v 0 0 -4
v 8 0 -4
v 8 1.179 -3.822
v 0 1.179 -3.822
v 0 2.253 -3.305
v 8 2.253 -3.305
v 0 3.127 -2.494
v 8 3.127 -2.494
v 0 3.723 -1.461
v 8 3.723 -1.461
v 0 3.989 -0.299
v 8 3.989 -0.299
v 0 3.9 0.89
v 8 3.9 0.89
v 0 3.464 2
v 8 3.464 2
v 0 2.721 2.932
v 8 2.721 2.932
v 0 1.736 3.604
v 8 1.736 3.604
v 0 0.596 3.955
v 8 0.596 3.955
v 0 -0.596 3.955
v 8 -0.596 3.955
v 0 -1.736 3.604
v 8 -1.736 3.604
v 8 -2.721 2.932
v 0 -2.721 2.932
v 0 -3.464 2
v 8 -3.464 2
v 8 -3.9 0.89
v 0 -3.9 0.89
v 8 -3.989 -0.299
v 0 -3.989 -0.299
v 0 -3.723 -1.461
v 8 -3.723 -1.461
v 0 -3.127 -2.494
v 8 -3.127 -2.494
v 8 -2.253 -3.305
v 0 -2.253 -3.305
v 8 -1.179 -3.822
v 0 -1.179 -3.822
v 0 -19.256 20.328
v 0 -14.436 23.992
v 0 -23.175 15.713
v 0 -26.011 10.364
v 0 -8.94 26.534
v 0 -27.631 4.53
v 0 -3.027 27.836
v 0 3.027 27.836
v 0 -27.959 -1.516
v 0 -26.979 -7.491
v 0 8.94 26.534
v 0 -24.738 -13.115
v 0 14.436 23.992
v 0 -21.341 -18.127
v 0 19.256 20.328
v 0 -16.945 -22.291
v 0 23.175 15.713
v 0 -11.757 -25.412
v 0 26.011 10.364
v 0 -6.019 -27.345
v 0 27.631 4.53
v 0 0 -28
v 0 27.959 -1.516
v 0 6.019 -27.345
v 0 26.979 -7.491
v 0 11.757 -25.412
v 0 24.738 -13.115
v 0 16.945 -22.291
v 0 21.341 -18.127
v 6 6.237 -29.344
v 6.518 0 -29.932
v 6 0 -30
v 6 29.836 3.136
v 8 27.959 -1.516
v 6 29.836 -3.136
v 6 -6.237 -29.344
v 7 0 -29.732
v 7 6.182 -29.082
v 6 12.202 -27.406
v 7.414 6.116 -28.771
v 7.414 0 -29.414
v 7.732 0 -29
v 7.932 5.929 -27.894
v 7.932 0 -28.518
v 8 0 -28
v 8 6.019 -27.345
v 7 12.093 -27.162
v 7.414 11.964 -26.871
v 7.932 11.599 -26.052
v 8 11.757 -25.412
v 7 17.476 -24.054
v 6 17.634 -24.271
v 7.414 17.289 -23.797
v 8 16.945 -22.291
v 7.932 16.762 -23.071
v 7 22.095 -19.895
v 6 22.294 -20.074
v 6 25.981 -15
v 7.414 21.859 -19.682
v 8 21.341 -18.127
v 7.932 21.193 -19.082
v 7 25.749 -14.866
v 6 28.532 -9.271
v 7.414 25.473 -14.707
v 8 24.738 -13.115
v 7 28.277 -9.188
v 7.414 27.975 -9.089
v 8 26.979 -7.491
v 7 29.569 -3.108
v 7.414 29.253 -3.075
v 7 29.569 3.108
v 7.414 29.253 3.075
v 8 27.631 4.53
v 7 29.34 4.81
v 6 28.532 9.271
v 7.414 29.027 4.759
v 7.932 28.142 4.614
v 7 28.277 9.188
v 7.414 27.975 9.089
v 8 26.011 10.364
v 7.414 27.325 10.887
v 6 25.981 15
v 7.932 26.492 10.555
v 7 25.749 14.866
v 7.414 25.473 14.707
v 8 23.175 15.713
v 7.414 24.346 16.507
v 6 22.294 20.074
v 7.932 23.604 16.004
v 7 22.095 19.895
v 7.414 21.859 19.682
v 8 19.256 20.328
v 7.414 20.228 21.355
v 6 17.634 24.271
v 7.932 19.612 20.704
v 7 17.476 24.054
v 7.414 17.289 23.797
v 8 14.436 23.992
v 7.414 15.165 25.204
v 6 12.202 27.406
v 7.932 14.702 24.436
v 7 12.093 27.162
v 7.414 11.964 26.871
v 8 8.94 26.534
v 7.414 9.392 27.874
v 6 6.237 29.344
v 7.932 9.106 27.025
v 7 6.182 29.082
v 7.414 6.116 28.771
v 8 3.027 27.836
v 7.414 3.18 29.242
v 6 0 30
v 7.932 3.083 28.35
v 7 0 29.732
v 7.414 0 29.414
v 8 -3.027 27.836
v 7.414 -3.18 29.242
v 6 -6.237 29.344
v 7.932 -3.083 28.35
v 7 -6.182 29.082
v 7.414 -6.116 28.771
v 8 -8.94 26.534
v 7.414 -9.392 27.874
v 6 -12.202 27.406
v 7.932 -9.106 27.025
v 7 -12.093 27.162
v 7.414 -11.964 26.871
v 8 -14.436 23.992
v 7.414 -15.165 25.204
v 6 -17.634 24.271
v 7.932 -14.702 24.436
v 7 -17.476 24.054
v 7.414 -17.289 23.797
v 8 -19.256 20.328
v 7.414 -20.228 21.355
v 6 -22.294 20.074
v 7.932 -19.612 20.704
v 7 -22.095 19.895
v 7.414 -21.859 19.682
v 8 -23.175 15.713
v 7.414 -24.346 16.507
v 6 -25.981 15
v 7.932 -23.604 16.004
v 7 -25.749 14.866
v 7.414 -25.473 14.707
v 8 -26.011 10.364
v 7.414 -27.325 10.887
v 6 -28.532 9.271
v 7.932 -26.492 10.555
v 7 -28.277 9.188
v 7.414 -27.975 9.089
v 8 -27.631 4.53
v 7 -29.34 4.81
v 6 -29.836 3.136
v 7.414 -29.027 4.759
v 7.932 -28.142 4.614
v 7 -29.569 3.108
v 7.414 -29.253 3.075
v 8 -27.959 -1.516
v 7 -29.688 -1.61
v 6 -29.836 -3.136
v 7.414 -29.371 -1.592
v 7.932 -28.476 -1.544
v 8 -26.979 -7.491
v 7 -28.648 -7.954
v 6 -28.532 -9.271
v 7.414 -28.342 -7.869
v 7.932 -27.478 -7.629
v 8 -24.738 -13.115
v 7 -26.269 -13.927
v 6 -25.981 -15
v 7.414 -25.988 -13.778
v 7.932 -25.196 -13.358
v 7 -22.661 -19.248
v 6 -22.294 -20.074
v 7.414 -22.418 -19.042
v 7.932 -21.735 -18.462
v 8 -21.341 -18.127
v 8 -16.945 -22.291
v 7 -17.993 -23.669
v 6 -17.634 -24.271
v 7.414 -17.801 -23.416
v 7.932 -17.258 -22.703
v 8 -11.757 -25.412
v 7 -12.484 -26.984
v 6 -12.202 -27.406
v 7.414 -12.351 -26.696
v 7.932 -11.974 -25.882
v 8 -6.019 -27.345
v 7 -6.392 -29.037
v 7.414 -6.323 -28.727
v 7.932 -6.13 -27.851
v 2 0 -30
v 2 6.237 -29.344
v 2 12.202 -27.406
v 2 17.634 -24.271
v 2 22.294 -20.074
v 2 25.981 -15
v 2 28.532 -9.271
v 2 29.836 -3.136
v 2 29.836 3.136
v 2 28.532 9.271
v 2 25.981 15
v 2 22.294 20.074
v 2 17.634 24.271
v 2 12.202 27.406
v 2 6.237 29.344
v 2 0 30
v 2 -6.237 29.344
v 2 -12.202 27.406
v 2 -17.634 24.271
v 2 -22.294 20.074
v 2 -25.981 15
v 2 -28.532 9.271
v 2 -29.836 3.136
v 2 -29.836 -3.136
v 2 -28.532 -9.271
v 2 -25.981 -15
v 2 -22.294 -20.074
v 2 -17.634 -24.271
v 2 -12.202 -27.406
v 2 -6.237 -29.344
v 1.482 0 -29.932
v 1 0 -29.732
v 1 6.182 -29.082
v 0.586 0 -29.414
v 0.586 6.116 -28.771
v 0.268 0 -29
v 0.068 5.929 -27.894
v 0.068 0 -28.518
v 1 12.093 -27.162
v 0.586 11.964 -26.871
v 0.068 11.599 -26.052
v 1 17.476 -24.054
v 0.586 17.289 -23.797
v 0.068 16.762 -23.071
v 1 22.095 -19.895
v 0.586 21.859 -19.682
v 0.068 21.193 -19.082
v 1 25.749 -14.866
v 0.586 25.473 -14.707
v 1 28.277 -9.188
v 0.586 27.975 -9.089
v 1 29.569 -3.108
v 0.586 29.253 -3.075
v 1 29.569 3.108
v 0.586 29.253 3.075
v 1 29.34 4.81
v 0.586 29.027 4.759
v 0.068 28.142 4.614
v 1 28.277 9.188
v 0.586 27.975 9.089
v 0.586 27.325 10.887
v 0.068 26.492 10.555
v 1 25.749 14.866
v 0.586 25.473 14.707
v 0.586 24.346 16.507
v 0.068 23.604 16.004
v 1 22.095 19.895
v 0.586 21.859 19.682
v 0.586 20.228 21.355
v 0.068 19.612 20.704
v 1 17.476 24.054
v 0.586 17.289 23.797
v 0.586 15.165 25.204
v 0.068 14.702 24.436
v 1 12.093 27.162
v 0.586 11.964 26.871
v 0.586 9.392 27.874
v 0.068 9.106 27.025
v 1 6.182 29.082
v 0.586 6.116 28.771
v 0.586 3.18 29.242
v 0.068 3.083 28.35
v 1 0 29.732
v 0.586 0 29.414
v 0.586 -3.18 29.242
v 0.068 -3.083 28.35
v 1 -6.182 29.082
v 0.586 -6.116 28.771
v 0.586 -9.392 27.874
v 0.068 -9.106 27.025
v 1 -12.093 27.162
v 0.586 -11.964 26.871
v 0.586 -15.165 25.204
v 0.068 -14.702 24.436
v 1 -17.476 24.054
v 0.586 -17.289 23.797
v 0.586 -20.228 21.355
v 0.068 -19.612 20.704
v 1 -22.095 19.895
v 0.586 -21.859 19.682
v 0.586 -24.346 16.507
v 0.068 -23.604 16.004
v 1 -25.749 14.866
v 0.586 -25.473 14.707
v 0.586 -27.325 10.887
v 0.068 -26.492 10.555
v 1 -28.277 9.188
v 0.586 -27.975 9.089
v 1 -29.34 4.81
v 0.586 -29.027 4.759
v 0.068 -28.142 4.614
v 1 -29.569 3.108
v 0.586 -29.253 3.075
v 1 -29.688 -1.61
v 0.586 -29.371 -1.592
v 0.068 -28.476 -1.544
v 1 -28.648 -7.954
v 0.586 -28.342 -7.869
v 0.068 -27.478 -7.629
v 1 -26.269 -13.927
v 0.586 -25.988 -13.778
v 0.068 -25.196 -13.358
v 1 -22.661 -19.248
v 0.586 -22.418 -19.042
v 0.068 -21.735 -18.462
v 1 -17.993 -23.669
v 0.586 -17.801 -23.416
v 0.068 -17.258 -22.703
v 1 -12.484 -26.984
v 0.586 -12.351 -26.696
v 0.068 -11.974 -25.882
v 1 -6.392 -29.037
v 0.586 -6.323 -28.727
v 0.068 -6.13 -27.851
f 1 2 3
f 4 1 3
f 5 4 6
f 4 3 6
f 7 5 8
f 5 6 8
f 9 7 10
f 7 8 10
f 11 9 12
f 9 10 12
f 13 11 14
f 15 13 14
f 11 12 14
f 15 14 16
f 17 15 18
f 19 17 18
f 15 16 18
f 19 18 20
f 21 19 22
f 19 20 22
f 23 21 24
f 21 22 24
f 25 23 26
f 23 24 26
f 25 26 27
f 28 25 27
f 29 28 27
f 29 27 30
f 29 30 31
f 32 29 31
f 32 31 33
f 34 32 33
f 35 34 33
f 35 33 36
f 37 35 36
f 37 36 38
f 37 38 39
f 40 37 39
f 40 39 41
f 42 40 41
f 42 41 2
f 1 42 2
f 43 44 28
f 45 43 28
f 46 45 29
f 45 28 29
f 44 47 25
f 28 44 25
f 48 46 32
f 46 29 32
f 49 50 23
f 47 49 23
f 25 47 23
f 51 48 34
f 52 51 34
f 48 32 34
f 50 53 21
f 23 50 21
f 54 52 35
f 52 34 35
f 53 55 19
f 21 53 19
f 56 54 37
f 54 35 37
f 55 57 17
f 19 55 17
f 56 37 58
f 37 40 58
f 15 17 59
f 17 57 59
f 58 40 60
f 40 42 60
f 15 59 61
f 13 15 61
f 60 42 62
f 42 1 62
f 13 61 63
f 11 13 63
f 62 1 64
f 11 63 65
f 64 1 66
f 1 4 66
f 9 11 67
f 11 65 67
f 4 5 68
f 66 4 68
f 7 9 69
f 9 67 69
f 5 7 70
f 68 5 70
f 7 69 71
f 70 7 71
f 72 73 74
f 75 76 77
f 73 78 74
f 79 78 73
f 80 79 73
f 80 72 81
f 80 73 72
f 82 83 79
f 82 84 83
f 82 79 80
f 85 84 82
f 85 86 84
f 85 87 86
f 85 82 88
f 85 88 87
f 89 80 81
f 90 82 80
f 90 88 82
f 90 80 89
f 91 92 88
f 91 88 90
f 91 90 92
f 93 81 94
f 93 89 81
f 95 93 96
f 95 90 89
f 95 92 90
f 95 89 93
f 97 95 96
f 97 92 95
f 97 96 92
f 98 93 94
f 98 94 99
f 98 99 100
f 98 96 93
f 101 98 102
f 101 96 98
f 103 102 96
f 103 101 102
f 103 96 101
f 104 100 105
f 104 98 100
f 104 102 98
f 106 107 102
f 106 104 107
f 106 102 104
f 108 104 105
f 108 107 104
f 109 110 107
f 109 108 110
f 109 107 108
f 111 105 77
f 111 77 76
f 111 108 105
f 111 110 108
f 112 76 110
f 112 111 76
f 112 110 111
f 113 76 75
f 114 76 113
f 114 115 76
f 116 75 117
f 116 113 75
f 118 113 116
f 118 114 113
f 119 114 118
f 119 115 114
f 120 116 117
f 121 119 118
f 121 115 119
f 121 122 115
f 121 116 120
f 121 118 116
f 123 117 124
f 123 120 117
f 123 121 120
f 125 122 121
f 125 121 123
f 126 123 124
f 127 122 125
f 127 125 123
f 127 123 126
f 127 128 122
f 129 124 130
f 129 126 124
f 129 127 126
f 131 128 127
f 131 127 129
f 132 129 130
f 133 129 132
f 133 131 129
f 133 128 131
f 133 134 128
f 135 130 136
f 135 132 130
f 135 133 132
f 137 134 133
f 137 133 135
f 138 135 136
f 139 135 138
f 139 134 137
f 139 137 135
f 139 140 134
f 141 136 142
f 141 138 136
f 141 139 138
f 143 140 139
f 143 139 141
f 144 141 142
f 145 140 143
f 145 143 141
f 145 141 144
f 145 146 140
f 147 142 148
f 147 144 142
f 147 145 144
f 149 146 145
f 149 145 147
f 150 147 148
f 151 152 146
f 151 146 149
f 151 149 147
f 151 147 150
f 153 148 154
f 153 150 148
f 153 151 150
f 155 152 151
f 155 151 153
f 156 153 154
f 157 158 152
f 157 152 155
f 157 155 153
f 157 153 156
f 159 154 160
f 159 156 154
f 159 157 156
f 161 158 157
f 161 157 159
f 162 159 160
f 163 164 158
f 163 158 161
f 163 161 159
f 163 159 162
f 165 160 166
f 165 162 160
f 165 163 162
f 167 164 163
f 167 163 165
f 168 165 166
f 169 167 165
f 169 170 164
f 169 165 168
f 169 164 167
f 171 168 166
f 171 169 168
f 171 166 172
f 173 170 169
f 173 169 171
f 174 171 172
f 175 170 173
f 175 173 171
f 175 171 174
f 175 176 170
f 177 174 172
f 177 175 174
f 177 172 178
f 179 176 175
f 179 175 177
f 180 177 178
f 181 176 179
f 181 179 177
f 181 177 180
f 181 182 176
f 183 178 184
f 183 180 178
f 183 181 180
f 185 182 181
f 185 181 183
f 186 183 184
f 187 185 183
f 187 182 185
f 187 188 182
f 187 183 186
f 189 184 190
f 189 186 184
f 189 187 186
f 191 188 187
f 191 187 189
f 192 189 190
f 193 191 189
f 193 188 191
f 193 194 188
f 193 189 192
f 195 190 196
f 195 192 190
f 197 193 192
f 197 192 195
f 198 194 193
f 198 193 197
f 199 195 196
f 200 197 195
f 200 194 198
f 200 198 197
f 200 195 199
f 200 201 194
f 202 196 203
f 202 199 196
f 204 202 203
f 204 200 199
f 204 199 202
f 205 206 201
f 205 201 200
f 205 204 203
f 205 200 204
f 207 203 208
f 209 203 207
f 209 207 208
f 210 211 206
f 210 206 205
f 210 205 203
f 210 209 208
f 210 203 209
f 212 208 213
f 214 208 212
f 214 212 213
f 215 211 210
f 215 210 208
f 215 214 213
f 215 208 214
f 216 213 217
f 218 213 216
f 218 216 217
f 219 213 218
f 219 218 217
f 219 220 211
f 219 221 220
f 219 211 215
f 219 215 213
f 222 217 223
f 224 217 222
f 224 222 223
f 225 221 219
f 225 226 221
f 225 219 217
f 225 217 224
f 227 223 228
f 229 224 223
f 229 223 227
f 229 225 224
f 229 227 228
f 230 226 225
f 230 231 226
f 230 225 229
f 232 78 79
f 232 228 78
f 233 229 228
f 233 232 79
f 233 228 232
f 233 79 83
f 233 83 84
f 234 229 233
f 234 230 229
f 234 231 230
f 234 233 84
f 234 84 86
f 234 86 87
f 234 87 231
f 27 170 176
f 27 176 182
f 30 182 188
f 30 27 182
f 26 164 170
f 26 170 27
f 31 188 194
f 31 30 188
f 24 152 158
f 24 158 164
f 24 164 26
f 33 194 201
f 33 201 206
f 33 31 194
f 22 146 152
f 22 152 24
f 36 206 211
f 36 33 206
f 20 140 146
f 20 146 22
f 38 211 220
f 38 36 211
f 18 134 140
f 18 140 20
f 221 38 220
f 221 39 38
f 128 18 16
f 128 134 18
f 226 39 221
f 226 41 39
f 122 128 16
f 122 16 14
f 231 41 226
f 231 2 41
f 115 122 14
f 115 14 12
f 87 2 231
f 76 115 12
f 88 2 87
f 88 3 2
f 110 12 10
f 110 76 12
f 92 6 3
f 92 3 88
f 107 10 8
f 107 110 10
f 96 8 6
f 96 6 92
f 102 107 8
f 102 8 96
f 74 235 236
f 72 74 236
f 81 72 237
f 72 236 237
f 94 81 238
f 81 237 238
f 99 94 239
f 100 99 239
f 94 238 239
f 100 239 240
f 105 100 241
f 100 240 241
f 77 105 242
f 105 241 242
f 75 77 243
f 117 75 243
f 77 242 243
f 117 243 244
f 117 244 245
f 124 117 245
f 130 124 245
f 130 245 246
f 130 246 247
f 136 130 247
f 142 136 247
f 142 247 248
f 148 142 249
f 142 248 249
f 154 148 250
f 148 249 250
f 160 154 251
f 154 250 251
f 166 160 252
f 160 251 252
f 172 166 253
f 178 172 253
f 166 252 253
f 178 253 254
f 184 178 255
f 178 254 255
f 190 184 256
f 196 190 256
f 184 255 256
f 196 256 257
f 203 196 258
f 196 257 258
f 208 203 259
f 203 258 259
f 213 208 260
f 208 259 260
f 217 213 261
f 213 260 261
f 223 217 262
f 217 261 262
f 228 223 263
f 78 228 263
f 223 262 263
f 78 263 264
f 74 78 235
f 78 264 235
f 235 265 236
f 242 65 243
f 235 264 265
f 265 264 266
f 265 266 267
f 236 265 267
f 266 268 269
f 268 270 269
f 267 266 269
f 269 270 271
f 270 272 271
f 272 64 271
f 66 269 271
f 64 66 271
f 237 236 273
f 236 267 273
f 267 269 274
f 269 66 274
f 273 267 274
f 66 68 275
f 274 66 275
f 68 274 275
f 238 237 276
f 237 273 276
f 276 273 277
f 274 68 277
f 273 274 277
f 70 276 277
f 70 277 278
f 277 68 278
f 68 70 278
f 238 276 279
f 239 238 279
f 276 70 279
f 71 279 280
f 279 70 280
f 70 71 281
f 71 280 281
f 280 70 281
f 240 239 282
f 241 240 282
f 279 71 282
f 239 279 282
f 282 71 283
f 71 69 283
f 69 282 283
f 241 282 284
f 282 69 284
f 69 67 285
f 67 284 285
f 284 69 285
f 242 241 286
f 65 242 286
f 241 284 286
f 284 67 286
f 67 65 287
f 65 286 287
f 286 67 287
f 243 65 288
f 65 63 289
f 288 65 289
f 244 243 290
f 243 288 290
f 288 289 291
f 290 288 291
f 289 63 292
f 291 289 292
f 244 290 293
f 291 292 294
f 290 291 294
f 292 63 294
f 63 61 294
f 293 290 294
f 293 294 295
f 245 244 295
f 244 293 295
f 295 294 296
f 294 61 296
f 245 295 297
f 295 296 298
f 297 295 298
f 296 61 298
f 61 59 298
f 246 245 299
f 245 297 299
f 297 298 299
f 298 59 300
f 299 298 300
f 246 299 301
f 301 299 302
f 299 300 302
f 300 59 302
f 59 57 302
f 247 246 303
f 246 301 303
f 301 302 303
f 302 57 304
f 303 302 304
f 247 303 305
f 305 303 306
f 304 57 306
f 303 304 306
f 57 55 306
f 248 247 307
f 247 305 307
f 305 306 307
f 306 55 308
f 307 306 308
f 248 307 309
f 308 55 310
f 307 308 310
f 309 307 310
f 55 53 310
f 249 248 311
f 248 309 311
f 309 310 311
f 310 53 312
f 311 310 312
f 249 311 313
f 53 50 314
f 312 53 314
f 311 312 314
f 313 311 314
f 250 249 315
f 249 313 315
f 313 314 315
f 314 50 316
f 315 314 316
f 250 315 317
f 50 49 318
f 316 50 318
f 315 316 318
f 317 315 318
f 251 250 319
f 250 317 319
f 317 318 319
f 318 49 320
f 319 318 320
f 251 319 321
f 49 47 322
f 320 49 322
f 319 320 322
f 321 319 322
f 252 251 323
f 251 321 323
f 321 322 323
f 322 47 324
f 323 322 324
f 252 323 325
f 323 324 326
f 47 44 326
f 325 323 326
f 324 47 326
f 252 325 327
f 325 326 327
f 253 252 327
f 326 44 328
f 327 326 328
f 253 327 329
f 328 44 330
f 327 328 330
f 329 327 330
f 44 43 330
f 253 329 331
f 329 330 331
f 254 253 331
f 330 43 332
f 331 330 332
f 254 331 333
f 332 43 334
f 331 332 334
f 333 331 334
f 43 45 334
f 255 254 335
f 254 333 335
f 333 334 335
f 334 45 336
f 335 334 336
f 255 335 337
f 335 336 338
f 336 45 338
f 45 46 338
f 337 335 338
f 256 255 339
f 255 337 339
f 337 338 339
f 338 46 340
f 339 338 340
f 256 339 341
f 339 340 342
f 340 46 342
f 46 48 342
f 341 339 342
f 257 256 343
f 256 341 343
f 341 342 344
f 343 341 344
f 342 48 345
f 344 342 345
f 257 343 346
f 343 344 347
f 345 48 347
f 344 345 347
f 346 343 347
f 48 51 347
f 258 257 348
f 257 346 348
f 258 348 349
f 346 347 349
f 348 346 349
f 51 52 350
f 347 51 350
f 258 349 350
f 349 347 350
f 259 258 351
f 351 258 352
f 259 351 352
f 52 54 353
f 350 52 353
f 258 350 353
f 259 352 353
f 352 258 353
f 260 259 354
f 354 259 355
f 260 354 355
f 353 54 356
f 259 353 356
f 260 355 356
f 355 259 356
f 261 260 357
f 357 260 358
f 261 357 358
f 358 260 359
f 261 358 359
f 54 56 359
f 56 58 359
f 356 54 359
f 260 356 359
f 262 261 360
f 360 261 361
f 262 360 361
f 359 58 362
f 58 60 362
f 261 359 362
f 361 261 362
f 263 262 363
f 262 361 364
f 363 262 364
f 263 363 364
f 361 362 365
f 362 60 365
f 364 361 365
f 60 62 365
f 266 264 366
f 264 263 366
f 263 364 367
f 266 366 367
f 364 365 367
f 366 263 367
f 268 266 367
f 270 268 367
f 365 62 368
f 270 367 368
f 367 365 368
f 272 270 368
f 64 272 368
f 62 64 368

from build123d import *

# Parameters (mm, degrees)
SCHIZZO1_R                   = 30
ESTRUSIONE_ESTRUSIONE1_DEPTH = 8
SCHIZZO3_R                   = 4
TAGLIO_ESTRUSIONE1_DEPTH     = 9
RACCORDO1_R                  = 2


with BuildPart() as part:
    # Schizzo1 → Estrusione-Estrusione1 (new body)
    with BuildSketch(Plane(origin=(0, 0, 0), x_dir=(0, 0, -1), z_dir=(1, 0, 0))):
        Circle(SCHIZZO1_R)
    extrude(amount=ESTRUSIONE_ESTRUSIONE1_DEPTH)

    # Schizzo3 → Taglio-Estrusione1 (cut, through all)
    with BuildSketch(Plane(origin=(8, 0, 0), x_dir=(0, 0, -1), z_dir=(1, 0, 0))):
        Circle(SCHIZZO3_R)
    extrude(amount=-TAGLIO_ESTRUSIONE1_DEPTH, mode=Mode.SUBTRACT)

    # Raccordo1
    raccordo1_edges = [part.edges().sort_by_distance(p)[0] for p in [
        (0, 0, 30),
        (8, 0, 30),
    ]]
    fillet(raccordo1_edges, radius=RACCORDO1_R)


solid = part.part
